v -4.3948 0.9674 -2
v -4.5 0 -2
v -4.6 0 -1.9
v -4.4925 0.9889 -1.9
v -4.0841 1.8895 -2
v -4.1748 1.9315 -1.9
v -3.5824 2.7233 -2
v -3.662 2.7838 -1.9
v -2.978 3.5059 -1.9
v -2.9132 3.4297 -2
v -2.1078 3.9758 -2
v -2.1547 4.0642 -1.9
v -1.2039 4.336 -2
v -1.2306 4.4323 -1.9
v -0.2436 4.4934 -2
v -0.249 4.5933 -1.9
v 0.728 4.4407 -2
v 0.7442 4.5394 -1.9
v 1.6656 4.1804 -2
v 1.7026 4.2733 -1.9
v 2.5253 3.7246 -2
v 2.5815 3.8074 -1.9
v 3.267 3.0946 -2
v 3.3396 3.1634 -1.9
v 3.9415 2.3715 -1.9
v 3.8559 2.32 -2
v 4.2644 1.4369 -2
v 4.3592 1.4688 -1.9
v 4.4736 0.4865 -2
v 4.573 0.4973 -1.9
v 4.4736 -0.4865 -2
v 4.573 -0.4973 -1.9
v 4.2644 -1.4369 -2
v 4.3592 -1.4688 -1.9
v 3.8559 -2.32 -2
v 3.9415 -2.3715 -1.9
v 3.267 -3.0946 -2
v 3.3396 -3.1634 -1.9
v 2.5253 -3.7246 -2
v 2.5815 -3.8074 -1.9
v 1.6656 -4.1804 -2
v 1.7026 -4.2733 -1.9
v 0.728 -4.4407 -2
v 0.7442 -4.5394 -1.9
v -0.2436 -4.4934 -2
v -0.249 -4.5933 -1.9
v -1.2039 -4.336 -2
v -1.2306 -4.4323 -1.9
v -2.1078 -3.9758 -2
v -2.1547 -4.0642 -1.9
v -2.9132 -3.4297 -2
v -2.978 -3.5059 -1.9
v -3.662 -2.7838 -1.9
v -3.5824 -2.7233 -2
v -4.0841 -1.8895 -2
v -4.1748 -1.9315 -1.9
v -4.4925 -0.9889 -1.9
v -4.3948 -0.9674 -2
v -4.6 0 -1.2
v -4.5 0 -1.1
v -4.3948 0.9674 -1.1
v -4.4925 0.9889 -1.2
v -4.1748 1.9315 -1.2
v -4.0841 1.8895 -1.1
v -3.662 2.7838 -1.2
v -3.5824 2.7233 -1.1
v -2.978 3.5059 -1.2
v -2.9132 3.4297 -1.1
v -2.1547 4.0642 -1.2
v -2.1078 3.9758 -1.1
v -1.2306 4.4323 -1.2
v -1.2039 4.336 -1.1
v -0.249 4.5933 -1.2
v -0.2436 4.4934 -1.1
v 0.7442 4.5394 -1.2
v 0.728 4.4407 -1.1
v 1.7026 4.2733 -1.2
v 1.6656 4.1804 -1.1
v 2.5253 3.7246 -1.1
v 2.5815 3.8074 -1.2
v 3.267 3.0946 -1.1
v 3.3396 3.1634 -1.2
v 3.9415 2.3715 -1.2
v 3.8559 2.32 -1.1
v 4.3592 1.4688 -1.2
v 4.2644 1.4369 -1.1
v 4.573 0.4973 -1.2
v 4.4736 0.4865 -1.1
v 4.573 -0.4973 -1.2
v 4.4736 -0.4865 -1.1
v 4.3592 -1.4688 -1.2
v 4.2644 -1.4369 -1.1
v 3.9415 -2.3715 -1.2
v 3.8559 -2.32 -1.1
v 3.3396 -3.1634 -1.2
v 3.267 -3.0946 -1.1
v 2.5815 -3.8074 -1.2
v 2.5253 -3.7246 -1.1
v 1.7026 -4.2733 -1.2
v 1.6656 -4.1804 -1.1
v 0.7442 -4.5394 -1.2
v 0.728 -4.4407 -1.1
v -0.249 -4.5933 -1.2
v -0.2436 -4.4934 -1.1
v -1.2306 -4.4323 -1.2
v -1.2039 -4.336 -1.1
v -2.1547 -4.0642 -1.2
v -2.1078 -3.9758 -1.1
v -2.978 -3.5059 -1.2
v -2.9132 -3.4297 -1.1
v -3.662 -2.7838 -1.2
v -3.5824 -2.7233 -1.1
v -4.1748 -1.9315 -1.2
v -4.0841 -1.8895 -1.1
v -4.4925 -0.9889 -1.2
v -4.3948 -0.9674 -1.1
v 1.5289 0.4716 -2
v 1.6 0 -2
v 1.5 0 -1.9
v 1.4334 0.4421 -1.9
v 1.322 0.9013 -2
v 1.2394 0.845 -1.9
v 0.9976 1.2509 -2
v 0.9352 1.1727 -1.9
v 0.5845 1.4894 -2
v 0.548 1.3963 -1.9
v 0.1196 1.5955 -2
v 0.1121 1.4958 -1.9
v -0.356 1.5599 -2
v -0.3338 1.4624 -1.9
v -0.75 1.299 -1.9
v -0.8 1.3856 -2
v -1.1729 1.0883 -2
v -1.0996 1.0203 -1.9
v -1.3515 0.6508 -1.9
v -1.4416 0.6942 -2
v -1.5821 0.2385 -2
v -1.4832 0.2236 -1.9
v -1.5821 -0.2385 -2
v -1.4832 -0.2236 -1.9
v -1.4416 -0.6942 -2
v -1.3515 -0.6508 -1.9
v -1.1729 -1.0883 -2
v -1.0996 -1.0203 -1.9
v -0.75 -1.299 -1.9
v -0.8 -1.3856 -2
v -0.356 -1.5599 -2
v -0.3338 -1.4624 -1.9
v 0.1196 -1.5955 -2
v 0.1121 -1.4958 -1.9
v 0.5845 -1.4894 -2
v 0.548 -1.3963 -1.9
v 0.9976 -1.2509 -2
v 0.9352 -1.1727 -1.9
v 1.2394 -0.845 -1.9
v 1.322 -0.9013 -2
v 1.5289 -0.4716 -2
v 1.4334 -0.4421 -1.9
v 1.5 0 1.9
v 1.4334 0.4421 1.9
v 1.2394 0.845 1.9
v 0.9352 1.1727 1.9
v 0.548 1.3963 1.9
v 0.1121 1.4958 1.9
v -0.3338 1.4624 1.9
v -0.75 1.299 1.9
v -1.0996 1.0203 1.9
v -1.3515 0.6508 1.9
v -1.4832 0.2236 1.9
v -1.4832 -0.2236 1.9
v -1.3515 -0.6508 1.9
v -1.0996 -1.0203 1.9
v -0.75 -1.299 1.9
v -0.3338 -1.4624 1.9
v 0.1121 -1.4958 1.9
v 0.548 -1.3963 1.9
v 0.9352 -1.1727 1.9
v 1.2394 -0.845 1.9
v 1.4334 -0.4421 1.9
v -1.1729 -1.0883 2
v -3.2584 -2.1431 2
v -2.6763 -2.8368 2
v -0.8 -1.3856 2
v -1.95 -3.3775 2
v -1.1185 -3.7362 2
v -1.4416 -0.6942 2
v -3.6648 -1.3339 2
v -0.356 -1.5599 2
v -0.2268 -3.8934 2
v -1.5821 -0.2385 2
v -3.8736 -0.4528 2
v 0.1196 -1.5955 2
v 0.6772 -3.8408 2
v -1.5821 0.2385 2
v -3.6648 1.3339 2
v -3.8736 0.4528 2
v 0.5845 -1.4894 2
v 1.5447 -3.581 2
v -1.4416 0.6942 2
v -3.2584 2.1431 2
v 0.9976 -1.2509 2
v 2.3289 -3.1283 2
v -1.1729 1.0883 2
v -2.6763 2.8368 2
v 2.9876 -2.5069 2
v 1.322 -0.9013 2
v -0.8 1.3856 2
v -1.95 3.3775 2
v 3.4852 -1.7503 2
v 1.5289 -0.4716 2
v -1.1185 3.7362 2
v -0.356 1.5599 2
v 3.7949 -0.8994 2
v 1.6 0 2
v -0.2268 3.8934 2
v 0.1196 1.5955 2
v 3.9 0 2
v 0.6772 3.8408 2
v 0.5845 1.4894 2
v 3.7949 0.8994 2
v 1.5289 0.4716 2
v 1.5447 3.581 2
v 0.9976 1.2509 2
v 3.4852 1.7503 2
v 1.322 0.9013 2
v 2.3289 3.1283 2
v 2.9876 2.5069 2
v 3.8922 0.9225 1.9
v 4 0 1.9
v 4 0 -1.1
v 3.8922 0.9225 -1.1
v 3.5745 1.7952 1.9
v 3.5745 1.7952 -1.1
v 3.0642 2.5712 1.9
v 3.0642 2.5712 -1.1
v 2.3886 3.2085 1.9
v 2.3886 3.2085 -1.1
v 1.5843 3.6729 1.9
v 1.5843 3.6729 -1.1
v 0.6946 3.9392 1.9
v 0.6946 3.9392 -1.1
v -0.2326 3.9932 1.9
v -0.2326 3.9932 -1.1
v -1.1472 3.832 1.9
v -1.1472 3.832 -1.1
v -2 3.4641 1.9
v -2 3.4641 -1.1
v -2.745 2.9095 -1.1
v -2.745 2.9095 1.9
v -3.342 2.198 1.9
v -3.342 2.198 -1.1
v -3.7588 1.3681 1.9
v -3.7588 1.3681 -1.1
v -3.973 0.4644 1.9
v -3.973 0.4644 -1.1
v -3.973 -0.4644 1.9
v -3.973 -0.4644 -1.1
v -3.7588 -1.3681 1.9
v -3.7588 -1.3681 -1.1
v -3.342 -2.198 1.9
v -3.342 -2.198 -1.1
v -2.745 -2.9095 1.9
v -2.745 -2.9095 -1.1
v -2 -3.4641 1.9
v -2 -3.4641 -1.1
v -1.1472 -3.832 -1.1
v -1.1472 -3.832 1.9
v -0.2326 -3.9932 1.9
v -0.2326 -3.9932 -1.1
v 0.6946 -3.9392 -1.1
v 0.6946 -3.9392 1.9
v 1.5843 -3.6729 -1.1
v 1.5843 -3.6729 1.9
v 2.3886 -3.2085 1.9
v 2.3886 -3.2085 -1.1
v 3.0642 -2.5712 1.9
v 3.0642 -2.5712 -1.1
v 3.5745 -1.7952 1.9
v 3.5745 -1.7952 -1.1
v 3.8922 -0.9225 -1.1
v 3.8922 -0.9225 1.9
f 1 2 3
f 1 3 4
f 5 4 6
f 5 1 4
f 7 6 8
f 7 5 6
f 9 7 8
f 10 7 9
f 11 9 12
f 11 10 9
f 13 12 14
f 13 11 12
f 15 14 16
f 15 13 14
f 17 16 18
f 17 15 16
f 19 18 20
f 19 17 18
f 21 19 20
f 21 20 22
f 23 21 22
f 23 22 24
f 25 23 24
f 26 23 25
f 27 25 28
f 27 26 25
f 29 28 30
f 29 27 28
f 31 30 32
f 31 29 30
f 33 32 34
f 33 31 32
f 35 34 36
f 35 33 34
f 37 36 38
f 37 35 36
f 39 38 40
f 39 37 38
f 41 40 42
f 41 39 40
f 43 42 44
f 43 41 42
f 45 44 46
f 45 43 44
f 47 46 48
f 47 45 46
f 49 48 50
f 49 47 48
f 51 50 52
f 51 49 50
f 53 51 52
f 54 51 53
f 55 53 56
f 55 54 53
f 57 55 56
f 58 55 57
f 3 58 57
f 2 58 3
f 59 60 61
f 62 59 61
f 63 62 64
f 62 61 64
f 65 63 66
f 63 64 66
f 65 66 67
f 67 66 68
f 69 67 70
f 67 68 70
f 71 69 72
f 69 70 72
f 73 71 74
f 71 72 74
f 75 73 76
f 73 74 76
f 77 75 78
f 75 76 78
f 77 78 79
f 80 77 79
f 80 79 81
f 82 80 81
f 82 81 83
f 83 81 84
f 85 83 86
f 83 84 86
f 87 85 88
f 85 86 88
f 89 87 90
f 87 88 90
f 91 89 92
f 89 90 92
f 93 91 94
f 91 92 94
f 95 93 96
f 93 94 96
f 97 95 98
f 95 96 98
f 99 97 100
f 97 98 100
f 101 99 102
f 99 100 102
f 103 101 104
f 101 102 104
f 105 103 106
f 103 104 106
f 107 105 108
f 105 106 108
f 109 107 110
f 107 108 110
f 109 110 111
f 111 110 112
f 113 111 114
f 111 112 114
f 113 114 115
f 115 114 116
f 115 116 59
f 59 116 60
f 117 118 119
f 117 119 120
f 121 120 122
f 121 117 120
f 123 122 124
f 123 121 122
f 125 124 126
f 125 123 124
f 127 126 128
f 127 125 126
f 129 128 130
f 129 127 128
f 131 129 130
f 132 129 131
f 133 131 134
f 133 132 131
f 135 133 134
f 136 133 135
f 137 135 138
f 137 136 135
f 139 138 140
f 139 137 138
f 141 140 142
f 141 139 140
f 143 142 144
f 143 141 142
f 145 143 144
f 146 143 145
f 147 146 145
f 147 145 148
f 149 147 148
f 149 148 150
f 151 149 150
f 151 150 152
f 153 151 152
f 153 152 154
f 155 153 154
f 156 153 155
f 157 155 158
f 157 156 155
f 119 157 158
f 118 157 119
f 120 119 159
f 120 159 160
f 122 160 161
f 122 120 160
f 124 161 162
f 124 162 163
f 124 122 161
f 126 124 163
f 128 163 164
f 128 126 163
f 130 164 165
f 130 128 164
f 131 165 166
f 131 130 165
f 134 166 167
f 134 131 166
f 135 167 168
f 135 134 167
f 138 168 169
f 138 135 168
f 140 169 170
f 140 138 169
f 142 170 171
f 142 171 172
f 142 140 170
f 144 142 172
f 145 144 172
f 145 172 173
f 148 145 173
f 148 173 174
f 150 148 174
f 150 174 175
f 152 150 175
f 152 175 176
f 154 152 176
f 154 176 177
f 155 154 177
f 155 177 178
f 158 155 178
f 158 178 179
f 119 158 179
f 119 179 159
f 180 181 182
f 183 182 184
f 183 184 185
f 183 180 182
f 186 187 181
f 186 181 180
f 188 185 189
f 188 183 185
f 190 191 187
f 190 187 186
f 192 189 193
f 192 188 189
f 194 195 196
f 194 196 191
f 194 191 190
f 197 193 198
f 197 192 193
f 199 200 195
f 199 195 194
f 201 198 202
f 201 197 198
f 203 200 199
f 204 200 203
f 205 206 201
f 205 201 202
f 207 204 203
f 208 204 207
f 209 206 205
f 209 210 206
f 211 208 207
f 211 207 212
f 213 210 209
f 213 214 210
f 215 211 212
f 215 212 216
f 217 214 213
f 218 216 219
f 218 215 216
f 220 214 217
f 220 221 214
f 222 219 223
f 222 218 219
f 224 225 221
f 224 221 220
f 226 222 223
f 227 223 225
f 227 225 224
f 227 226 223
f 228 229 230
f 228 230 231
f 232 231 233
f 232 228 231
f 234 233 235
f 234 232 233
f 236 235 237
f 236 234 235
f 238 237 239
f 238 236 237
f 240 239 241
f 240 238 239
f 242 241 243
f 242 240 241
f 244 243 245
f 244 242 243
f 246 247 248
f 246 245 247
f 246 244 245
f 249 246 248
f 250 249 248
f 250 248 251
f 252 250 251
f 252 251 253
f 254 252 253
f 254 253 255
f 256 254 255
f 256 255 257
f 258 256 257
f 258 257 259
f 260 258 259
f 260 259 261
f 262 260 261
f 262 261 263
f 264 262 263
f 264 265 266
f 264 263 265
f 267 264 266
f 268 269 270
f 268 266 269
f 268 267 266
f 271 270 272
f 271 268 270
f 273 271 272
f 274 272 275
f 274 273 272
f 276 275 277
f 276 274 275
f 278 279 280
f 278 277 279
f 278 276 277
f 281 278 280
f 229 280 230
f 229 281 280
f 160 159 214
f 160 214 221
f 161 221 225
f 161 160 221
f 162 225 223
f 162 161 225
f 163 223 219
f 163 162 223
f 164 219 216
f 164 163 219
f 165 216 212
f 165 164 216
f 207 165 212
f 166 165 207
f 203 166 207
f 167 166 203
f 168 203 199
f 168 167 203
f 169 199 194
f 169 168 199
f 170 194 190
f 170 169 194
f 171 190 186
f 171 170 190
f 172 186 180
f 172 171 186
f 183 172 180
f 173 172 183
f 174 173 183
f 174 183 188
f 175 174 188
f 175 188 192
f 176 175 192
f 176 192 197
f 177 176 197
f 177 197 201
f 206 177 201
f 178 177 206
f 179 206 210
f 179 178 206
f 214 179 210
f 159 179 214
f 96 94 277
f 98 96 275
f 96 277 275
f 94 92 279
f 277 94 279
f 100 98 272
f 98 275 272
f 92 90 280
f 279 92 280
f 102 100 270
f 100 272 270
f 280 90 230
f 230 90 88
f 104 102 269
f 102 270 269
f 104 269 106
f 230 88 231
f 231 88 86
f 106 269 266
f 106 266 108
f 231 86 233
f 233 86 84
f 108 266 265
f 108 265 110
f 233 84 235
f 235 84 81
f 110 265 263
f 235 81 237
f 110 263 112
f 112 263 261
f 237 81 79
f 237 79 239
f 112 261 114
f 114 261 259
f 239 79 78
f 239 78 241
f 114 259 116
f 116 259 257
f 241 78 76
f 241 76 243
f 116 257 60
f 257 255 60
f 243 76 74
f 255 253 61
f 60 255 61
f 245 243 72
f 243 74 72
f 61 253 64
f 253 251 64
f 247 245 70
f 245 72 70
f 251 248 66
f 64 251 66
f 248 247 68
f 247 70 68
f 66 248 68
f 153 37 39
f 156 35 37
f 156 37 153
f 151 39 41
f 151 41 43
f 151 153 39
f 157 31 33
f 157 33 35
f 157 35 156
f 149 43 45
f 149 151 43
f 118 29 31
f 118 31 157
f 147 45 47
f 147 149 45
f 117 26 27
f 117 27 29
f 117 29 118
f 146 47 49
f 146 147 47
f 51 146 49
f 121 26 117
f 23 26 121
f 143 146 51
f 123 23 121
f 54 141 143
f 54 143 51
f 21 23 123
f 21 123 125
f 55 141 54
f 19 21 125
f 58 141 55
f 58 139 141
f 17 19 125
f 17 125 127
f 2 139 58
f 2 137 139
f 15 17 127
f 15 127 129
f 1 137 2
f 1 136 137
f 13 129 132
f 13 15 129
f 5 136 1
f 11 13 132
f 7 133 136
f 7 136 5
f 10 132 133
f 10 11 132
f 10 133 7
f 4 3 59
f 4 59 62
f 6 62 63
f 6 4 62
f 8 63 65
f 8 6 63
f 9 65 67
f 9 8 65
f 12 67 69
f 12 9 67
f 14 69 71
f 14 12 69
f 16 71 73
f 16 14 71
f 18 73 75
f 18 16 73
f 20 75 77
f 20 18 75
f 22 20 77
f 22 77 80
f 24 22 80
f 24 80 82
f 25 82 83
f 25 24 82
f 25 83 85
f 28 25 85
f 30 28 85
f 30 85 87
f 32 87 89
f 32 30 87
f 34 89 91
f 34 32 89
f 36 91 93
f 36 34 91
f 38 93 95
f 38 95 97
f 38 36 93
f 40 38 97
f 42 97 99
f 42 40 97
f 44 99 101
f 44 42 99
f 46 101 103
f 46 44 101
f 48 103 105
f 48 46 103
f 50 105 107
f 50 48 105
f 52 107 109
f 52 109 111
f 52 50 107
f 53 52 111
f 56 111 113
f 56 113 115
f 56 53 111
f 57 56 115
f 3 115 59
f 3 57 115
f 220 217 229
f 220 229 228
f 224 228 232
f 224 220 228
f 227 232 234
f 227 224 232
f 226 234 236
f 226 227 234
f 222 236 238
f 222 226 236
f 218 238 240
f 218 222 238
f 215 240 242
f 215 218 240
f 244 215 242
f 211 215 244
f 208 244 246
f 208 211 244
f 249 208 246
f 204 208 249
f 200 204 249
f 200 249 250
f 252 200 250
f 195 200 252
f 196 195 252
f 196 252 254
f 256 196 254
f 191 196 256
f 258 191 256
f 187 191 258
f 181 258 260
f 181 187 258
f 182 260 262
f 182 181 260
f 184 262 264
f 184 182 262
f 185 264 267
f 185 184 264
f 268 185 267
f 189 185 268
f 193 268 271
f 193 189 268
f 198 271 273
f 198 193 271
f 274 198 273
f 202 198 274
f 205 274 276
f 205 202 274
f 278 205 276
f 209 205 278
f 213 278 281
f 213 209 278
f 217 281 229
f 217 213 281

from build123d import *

# Parameters (mm, degrees)
SKETCH_1_R      = 4
SKETCH_1_R_2    = 1.5
EXTRUDE_1_DEPTH = 2
SKETCH_2_R      = 4.6
SKETCH_2_R_2    = 4
EXTRUDE_2_DEPTH = 0.9
CHAMFER_1_SIZE  = 0.1


with BuildPart() as part:
    # 草图1 → 凸台-拉伸1 (new body, symmetric)
    with BuildSketch(Plane.XY):
        Circle(SKETCH_1_R)
        Circle(SKETCH_1_R_2, mode=Mode.SUBTRACT)
    extrude(amount=EXTRUDE_1_DEPTH, both=True)

    # 草图2 → 凸台-拉伸2 (add)
    with BuildSketch(Plane(origin=(0, 0, -2), x_dir=(-1, 0, 0), z_dir=(0, 0, -1))):
        Circle(SKETCH_2_R)
        Circle(SKETCH_2_R_2, mode=Mode.SUBTRACT)
    extrude(amount=-EXTRUDE_2_DEPTH)

    # 倒角1
    chamfer_1_edges = [part.edges().sort_by_distance(p)[0] for p in [
        (4.6, 0, -1.1),
        (4.6, 0, -2),
        (-4, 0, 2),
        (-1.5, 0, -2),
        (-1.5, 0, 2),
    ]]
    chamfer(chamfer_1_edges, length=CHAMFER_1_SIZE)


solid = part.part
